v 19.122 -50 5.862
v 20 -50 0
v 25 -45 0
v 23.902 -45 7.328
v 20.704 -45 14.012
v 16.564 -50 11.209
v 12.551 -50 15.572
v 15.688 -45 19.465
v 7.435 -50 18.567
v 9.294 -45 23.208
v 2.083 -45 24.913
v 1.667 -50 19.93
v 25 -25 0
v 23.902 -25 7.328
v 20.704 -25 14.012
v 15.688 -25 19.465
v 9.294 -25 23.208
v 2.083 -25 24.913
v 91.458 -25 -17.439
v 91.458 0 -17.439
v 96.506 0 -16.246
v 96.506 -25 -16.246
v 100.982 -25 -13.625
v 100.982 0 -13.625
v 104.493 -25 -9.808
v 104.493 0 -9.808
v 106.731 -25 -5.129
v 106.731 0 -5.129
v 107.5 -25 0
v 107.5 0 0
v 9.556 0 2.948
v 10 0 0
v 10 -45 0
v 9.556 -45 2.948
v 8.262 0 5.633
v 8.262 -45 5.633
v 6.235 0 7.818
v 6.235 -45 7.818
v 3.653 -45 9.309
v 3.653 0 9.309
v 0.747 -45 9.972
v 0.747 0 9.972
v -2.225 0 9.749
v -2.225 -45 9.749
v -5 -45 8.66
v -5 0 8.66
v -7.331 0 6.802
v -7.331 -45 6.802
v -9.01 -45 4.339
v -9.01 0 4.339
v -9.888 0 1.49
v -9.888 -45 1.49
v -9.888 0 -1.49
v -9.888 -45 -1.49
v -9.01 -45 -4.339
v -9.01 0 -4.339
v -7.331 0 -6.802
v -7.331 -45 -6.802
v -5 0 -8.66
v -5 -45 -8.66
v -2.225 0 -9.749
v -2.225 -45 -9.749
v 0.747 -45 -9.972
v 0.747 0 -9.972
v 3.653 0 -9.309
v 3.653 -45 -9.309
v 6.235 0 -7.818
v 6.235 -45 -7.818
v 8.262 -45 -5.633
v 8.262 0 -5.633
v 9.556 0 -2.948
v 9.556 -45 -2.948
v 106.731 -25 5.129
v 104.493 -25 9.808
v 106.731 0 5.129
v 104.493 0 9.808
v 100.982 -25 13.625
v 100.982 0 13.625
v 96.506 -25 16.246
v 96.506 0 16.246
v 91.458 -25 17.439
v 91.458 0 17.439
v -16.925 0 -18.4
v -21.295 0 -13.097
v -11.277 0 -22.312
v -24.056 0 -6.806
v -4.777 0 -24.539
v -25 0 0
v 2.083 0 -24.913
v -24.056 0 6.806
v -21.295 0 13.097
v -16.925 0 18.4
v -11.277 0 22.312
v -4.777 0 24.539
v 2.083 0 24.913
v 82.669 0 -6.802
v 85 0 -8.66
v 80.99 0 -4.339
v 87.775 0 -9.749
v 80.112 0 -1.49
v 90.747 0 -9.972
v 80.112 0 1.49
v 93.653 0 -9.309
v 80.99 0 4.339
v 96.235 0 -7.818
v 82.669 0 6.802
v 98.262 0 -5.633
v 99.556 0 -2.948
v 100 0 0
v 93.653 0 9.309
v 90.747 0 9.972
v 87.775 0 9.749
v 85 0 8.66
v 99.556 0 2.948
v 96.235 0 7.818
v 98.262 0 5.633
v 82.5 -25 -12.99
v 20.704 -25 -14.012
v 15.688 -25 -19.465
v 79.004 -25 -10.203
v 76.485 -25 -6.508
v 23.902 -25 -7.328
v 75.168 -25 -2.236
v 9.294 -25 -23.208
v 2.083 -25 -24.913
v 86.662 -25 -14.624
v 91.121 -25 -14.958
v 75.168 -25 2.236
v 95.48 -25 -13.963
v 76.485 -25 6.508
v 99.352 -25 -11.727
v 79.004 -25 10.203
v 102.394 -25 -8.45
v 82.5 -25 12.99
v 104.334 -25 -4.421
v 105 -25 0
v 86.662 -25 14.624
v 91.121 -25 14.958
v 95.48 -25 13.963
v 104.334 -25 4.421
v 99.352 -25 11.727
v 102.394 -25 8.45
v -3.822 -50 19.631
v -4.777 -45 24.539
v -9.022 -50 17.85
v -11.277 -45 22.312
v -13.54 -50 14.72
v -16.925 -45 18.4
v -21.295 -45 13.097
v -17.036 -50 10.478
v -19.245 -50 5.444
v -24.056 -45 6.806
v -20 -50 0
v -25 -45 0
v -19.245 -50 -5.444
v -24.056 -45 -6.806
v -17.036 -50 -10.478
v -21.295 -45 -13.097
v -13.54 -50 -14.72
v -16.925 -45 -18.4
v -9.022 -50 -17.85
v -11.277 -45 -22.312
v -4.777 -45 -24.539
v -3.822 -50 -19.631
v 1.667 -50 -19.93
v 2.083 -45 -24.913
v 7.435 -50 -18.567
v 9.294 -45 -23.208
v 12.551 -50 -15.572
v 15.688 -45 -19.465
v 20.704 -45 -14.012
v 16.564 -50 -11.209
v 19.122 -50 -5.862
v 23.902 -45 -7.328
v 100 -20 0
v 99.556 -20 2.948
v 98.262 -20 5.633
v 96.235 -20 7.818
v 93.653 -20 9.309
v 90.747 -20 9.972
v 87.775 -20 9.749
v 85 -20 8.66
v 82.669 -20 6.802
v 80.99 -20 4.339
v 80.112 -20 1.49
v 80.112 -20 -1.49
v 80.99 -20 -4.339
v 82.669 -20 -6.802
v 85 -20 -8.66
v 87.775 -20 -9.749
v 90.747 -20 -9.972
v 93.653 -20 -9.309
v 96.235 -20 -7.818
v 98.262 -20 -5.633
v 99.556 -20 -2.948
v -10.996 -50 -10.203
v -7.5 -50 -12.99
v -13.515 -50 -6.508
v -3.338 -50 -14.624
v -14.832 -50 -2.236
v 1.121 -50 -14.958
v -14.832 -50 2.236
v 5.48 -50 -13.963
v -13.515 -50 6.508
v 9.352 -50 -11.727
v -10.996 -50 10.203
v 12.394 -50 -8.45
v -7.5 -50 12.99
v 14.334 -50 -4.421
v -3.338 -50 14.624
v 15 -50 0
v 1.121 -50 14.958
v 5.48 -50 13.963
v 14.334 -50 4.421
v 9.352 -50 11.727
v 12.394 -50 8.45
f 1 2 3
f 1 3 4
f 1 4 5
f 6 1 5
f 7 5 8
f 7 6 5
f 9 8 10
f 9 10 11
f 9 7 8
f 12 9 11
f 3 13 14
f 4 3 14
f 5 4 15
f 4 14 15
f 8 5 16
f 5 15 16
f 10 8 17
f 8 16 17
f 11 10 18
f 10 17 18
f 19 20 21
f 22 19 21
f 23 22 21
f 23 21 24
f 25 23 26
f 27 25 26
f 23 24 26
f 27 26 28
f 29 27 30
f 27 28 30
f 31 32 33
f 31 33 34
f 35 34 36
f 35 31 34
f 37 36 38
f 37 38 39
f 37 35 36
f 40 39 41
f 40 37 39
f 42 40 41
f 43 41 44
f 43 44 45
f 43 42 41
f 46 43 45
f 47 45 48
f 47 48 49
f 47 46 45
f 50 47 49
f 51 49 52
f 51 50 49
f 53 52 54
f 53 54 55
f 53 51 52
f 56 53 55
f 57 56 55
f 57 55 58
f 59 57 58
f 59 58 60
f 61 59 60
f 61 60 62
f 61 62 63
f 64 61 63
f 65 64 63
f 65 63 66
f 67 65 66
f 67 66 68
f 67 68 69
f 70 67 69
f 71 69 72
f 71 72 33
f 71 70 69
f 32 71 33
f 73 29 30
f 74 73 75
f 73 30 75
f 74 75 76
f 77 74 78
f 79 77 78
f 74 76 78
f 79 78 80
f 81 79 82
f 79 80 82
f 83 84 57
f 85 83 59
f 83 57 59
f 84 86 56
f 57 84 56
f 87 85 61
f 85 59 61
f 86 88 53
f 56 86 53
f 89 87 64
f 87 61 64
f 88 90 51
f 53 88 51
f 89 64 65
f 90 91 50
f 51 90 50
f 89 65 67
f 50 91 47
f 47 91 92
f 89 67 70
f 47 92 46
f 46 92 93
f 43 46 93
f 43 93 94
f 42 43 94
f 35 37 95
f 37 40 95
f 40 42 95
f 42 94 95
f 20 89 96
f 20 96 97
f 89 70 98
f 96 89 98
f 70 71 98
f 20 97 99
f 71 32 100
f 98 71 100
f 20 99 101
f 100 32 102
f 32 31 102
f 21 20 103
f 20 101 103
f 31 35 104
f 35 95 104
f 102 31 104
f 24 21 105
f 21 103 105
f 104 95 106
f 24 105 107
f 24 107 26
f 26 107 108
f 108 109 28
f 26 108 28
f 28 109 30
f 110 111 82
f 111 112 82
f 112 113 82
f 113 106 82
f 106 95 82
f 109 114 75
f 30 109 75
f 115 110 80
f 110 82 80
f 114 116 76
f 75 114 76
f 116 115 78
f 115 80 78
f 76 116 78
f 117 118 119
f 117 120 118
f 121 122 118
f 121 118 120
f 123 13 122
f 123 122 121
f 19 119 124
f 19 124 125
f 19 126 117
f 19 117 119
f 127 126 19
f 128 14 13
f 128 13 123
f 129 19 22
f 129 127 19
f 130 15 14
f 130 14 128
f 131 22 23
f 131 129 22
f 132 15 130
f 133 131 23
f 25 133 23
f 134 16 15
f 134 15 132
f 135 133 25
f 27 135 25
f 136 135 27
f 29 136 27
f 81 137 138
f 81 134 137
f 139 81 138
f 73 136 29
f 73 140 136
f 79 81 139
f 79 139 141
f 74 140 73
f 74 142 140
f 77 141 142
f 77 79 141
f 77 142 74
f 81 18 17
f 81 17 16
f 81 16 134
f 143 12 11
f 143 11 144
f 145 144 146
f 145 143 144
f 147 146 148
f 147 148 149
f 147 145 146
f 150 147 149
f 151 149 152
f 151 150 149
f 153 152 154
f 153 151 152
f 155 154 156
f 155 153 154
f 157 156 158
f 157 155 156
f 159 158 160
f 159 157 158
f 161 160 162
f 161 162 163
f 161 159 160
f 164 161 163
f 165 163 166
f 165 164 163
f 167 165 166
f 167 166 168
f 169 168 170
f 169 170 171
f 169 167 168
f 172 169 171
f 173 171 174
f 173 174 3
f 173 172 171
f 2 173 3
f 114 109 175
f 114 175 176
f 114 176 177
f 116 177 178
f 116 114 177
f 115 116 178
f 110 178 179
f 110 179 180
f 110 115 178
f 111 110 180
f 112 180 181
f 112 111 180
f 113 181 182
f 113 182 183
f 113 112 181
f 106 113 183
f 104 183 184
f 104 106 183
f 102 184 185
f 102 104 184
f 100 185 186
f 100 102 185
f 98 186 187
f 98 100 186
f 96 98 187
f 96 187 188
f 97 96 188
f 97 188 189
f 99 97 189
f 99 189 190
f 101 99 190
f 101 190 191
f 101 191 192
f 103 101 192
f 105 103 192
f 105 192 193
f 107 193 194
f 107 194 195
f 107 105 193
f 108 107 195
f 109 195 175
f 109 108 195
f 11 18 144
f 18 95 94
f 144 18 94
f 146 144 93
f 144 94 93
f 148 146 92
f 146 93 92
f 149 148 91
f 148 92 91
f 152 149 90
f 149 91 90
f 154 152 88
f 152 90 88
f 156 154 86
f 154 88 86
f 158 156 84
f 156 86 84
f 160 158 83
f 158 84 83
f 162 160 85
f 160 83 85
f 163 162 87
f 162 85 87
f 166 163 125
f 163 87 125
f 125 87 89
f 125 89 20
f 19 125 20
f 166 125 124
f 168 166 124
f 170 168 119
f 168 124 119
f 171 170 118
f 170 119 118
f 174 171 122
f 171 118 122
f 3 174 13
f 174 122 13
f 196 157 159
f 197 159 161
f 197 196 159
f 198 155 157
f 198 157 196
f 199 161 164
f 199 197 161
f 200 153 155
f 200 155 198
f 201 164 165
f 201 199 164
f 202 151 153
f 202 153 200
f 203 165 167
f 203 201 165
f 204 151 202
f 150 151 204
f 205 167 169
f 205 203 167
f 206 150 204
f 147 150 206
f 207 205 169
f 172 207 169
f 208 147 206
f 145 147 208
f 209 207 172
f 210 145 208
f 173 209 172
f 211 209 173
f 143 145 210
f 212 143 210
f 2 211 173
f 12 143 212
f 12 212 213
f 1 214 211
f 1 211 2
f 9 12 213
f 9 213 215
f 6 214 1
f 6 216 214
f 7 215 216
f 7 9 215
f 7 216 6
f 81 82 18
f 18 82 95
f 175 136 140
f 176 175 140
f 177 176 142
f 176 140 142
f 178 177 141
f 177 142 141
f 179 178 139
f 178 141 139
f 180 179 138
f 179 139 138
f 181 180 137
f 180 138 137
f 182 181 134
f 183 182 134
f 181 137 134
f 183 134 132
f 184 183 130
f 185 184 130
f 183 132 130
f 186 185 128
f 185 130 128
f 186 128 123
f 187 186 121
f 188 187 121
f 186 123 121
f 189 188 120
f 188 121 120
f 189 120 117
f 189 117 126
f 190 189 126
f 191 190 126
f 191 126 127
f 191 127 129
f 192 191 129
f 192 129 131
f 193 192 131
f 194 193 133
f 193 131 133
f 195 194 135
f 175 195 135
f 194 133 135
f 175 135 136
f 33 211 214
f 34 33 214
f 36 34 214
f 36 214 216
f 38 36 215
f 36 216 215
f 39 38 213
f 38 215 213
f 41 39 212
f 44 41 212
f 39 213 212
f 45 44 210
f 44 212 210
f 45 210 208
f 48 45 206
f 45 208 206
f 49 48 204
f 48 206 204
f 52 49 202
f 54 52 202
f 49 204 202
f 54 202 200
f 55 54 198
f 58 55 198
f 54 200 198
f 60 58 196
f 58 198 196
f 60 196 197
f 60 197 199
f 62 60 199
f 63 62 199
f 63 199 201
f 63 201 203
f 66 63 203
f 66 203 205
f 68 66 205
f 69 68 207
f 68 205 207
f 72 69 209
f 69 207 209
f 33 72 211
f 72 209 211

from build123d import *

# Parameters (mm, degrees)
F0_R     = 10
F1_DEPTH = 25
F2_DEPTH = 50
F3_SIZE  = 5


with BuildPart() as f1:
    # F0 (on Front) → F1 (new body)
    with BuildSketch(Plane.XZ):
        with BuildLine():
            ThreePointArc((2.083333, 24.913043), (18.399502, 16.92508), (25, 0))
            ThreePointArc((25, 0), (18.399502, -16.92508), (2.083333, -24.913043))
            Line((2.083333, -24.913043), (91.458333, -17.43913))
            ThreePointArc((91.458333, -17.43913), (72.5, 0), (91.458333, 17.43913))
            Line((91.458333, 17.43913), (2.083333, 24.913043))
        make_face()
        with BuildLine():
            ThreePointArc((107.5, 0), (102.879651, 11.847556), (91.458333, 17.43913))
            ThreePointArc((91.458333, 17.43913), (72.5, 0), (91.458333, -17.43913))
            ThreePointArc((91.458333, -17.43913), (102.879651, -11.847556), (107.5, 0))
        make_face()
        with Locations((90, 0)):
            Circle(F0_R, mode=Mode.SUBTRACT)
        with BuildLine():
            ThreePointArc((2.083333, -24.913043), (18.399502, -16.92508), (25, 0))
            ThreePointArc((25, 0), (18.399502, 16.92508), (2.083333, 24.913043))
            ThreePointArc((2.083333, 24.913043), (-25, 0), (2.083333, -24.913043))
        make_face()
        Circle(F0_R, mode=Mode.SUBTRACT)
    extrude(amount=F1_DEPTH)

    # F0 (on Front) → F2 (join)
    with BuildSketch(Plane.XZ):
        with BuildLine():
            ThreePointArc((2.083333, -24.913043), (18.399502, -16.92508), (25, 0))
            ThreePointArc((25, 0), (18.399502, 16.92508), (2.083333, 24.913043))
            ThreePointArc((2.083333, 24.913043), (-25, 0), (2.083333, -24.913043))
        make_face()
        Circle(F0_R, mode=Mode.SUBTRACT)
    extrude(amount=F2_DEPTH)

    # F3
    f3_edges = [f1.edges().sort_by_distance(p)[0] for p in [
        (-2.083333, -50, 24.913043),
        (-10, -50, 0),
        (80, -25, 0),
    ]]
    chamfer(f3_edges, length=F3_SIZE)


solid = f1.part
